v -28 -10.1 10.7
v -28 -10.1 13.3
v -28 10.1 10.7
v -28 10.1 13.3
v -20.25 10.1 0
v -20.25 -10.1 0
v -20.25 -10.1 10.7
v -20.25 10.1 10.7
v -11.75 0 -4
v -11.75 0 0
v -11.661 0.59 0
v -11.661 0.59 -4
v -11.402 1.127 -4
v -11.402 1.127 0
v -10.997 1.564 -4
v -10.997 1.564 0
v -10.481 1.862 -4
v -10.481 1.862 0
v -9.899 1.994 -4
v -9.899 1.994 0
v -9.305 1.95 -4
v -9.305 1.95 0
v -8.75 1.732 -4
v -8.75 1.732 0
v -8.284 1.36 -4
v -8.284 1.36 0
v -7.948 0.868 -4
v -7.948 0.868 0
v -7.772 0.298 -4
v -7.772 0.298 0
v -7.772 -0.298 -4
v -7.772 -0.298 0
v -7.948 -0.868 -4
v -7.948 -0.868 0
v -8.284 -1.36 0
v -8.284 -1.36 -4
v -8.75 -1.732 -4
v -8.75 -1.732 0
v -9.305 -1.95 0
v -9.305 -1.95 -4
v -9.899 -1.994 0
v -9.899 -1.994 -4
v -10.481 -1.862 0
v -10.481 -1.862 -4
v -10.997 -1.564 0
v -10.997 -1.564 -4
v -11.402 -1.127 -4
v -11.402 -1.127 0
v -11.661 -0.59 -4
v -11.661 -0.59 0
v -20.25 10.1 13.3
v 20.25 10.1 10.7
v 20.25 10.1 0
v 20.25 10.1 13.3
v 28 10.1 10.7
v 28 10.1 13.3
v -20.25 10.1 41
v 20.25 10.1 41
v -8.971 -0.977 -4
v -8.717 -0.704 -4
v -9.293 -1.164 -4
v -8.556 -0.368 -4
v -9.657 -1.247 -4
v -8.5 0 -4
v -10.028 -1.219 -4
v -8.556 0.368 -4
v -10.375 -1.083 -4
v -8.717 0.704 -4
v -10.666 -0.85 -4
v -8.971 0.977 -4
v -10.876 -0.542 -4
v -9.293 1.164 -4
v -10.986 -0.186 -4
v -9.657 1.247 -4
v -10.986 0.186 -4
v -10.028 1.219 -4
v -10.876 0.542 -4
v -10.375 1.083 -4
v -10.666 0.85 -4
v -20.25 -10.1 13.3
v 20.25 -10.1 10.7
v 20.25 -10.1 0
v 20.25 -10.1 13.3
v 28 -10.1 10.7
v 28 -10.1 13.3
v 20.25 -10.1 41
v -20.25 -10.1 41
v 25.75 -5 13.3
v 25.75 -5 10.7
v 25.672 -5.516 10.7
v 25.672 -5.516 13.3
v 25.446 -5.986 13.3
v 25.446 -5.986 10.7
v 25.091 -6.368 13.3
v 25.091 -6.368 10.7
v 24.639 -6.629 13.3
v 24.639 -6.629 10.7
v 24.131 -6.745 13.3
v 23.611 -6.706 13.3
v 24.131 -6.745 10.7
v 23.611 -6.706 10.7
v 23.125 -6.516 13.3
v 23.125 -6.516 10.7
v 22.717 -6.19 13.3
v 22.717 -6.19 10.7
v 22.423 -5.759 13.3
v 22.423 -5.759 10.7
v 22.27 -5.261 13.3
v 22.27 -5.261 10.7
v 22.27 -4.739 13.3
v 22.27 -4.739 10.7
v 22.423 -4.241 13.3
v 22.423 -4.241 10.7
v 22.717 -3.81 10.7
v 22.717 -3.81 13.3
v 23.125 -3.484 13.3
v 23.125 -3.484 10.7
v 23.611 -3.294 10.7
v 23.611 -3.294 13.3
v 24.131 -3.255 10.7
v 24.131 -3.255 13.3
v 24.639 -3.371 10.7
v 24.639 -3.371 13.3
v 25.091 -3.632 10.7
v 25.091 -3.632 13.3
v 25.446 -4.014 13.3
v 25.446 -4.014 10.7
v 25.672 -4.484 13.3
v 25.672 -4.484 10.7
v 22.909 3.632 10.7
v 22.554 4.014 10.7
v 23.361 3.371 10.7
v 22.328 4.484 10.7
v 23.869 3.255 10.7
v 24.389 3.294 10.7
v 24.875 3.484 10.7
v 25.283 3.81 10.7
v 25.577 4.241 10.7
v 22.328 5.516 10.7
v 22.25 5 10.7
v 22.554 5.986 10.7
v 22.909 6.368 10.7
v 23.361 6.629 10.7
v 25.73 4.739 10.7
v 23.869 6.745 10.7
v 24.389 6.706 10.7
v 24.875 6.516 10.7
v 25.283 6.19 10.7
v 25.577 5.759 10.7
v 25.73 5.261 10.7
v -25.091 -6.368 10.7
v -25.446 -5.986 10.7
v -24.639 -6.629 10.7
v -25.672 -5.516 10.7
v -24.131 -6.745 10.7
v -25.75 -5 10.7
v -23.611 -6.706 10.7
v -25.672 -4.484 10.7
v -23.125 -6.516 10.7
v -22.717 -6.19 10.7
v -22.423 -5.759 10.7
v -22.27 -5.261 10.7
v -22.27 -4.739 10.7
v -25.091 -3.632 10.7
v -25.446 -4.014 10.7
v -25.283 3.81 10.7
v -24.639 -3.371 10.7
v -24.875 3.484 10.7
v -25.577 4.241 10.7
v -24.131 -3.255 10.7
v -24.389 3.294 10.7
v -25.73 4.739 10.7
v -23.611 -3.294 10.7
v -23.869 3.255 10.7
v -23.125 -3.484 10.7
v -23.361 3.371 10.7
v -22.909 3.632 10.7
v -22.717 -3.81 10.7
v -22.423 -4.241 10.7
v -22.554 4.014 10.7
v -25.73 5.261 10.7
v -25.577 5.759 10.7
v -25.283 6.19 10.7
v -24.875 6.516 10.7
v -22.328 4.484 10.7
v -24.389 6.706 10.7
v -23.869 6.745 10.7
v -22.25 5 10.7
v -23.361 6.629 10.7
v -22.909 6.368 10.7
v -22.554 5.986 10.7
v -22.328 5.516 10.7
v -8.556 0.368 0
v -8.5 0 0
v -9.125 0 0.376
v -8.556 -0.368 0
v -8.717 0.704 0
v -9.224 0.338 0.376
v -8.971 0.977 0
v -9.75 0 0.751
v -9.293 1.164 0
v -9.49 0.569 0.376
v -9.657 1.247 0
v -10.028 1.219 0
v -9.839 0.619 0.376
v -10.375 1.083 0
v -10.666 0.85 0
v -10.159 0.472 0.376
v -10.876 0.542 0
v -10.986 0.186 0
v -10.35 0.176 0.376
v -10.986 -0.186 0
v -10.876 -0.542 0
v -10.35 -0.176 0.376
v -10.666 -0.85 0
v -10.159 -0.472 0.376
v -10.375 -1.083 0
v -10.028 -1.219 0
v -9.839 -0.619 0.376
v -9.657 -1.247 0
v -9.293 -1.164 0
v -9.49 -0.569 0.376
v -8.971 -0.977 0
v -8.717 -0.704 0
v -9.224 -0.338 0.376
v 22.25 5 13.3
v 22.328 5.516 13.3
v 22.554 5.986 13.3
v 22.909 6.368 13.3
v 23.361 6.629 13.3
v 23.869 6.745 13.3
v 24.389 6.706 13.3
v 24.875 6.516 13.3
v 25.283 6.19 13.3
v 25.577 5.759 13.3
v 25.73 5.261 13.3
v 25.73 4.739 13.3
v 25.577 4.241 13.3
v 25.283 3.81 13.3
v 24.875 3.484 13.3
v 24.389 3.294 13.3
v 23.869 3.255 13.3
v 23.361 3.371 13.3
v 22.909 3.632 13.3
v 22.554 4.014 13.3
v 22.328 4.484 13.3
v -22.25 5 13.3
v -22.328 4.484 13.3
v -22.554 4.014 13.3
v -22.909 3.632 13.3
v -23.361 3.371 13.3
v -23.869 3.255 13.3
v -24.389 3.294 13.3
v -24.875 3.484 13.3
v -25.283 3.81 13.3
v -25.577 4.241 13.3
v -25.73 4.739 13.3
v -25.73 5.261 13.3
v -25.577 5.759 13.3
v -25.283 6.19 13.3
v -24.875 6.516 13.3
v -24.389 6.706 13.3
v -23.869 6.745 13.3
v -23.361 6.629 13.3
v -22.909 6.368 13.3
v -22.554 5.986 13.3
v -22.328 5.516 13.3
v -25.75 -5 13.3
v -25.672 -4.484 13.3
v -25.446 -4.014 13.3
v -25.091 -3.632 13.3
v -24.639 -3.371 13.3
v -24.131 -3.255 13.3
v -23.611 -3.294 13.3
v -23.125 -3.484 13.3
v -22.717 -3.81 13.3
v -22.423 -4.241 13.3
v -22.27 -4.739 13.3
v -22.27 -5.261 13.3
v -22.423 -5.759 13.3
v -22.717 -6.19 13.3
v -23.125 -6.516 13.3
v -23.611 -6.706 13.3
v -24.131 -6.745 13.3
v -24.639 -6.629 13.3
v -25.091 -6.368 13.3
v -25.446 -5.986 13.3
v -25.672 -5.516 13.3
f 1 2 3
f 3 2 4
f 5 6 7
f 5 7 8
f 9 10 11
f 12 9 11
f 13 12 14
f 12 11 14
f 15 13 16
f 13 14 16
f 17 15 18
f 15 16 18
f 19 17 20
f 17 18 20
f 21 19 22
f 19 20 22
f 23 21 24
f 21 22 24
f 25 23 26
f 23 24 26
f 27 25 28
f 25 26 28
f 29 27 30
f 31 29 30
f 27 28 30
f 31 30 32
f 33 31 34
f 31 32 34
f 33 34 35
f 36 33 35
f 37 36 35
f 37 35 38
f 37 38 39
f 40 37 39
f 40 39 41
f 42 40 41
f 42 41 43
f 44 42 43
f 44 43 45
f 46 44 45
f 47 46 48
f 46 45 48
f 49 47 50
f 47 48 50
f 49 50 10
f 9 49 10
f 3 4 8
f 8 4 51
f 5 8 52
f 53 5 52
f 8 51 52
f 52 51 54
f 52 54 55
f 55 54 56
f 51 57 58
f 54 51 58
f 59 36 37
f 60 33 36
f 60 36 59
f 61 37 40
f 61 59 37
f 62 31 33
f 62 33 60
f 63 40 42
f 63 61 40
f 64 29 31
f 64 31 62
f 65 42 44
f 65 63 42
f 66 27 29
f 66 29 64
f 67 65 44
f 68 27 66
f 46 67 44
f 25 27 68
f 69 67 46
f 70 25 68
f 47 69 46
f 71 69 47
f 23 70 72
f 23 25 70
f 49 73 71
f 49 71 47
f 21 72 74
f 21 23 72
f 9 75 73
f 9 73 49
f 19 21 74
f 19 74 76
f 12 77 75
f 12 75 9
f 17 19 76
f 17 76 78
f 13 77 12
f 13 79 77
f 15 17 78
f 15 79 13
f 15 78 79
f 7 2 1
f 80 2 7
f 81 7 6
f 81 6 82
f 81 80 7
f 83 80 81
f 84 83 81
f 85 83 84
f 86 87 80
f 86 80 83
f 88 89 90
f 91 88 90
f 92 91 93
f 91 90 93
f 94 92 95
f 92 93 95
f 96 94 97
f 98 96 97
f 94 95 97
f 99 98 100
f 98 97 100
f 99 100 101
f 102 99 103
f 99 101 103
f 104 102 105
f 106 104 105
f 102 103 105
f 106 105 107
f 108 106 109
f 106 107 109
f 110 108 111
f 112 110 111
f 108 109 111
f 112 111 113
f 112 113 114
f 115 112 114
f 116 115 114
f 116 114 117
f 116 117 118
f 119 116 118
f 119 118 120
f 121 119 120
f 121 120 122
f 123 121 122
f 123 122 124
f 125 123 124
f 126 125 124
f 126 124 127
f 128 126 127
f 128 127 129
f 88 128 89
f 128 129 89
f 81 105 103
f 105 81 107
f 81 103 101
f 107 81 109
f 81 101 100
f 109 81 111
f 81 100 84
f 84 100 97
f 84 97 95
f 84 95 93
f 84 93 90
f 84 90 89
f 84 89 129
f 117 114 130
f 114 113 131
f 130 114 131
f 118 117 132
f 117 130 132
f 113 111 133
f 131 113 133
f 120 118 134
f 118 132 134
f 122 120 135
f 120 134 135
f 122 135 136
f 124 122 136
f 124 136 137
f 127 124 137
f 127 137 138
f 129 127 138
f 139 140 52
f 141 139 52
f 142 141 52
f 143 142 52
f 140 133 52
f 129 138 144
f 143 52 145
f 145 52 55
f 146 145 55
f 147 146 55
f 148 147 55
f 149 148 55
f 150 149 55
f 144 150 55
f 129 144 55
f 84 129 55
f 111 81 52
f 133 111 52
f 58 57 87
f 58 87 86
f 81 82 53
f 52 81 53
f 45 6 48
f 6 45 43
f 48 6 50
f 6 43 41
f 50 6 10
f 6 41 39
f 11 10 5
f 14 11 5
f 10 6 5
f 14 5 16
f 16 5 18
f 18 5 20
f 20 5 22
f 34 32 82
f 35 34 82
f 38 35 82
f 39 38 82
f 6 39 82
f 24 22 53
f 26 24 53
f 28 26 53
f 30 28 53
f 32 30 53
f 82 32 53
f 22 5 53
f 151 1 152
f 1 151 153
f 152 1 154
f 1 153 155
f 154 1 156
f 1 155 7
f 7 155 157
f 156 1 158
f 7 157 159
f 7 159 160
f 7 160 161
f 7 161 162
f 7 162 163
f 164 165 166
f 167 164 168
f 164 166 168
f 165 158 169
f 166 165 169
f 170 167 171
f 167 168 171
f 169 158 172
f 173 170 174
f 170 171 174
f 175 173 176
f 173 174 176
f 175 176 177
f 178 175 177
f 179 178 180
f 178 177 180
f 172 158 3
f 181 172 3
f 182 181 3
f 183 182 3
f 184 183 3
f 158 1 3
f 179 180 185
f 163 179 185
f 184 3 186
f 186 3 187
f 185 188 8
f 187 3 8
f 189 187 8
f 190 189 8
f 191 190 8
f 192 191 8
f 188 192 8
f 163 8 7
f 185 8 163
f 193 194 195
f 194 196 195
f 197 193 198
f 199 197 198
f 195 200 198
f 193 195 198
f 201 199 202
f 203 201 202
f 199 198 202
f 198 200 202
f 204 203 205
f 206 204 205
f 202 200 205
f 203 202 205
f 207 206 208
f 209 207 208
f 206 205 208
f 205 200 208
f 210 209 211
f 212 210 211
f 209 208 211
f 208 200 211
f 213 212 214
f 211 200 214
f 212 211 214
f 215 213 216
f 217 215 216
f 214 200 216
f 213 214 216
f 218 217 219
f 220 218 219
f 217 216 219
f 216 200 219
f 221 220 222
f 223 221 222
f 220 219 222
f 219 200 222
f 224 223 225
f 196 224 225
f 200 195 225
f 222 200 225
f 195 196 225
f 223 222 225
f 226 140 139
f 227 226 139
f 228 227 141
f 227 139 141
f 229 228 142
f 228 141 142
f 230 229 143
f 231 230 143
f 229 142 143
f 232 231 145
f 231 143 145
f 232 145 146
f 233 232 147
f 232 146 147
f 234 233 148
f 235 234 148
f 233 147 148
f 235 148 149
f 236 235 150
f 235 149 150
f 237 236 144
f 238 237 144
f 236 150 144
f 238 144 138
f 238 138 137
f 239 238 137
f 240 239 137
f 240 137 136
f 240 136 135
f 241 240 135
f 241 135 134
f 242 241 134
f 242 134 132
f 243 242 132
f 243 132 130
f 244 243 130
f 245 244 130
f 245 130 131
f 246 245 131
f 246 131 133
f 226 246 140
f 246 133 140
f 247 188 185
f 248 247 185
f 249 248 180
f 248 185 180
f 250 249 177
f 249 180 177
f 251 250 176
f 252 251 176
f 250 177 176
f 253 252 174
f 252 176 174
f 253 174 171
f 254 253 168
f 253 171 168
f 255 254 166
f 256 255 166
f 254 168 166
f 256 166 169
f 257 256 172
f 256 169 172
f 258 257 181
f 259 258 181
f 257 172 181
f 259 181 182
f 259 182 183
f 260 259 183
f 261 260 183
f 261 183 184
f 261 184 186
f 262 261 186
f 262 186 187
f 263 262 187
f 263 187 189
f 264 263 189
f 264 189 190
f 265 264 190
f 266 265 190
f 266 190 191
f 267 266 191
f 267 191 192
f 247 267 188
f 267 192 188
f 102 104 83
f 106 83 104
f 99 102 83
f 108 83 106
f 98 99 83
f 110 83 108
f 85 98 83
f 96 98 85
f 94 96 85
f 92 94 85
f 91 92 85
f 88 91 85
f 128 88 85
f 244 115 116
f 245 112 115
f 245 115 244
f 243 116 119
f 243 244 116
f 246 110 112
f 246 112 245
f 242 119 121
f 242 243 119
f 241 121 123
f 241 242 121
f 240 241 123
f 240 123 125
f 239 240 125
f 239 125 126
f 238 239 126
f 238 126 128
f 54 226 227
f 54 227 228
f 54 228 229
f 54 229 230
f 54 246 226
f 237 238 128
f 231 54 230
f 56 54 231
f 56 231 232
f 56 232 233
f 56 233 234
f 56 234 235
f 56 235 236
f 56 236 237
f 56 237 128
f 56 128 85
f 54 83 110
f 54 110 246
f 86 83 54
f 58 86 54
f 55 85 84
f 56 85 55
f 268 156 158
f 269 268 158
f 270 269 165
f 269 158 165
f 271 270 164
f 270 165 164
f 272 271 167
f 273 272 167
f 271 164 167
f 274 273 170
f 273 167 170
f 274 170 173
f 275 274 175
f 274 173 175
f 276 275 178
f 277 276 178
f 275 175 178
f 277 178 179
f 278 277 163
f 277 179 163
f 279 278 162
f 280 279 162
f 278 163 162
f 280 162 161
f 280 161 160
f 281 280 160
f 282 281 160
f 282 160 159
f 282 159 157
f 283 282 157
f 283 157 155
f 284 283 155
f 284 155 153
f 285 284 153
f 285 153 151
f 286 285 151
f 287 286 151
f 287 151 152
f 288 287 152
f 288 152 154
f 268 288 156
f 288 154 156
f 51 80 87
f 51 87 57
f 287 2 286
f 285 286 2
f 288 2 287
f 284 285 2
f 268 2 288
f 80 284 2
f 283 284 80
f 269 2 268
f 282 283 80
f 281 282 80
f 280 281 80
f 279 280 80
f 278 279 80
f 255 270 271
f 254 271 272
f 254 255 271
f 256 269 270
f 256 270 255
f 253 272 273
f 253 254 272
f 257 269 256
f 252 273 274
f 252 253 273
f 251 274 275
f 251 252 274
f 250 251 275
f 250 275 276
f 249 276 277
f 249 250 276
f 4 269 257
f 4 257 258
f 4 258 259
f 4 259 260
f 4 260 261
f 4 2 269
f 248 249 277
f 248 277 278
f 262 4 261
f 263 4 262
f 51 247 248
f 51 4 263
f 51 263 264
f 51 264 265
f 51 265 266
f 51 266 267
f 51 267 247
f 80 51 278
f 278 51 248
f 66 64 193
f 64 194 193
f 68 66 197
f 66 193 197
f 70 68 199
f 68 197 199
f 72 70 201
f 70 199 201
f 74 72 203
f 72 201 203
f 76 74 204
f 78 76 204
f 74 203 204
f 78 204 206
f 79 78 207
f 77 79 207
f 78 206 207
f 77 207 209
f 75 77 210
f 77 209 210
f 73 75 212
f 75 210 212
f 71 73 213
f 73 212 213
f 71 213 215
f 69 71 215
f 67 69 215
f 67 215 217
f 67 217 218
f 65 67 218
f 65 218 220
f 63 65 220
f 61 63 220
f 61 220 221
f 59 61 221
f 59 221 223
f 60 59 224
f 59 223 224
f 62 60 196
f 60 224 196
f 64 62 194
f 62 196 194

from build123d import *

# Parameters (mm, degrees)
SKETCH_1_W          = 40.5
SKETCH_1_H          = 20.2
EXTRUDE_1_DEPTH     = 41
SKETCH_2_W          = 56
SKETCH_2_H          = 20.2
EXTRUDE_2_DEPTH     = 2.6
SKETCH_3_R          = 1.75
CUT_EXTRUDE_1_DEPTH = 2.6
SKETCH_4_R          = 2
EXTRUDE_3_DEPTH     = 4


# Read off the part's stored shape, not the designer's step: M3 螺纹孔1
with BuildPart() as part:
    # 草图1 → 凸台-拉伸1 (new body)
    with BuildSketch(Plane.XY):
        Rectangle(SKETCH_1_W, SKETCH_1_H)
    extrude(amount=EXTRUDE_1_DEPTH)

    # 草图2 → 凸台-拉伸2 (add)
    with BuildSketch(Plane.XY.offset(13.3)):
        Rectangle(SKETCH_2_W, SKETCH_2_H)
    extrude(amount=-EXTRUDE_2_DEPTH)

    # 草图3 → 切除-拉伸1 (cut)
    with BuildSketch(Plane(origin=(0, 0, 10.7), x_dir=(-1, 0, 0), z_dir=(0, 0, -1))):
        with Locations((-24, 5)):
            Circle(SKETCH_3_R)
        with Locations(Location((24, 5, 0), (0, 0, 180))):
            Circle(SKETCH_3_R)
        with Locations((24, -5)):
            Circle(SKETCH_3_R)
        with Locations(Location((-24, -5, 0), (0, 0, 180))):
            Circle(SKETCH_3_R)
    extrude(amount=-CUT_EXTRUDE_1_DEPTH, mode=Mode.SUBTRACT)

    # 草图4 → 凸台-拉伸3 (add)
    with BuildSketch(Plane(origin=(0, 0, 0), x_dir=(-1, 0, 0), z_dir=(0, 0, -1))):
        with Locations((9.75, 0)):
            Circle(SKETCH_4_R)
    extrude(amount=EXTRUDE_3_DEPTH)

    # M3 螺纹孔1 outline → M3 螺纹孔1 (revolve, cut)
    with BuildSketch(Plane(origin=(-9.75, 0, 0), x_dir=(1, 0, 0), z_dir=(0, -1, 0))):
        Polygon((1.25, 0), (0, 0.751075774), (0, -4), (1.25, -4), align=None)
    revolve(axis=Axis((-9.75, 0, 0), (0, 0, 1)), mode=Mode.SUBTRACT)


solid = part.part
